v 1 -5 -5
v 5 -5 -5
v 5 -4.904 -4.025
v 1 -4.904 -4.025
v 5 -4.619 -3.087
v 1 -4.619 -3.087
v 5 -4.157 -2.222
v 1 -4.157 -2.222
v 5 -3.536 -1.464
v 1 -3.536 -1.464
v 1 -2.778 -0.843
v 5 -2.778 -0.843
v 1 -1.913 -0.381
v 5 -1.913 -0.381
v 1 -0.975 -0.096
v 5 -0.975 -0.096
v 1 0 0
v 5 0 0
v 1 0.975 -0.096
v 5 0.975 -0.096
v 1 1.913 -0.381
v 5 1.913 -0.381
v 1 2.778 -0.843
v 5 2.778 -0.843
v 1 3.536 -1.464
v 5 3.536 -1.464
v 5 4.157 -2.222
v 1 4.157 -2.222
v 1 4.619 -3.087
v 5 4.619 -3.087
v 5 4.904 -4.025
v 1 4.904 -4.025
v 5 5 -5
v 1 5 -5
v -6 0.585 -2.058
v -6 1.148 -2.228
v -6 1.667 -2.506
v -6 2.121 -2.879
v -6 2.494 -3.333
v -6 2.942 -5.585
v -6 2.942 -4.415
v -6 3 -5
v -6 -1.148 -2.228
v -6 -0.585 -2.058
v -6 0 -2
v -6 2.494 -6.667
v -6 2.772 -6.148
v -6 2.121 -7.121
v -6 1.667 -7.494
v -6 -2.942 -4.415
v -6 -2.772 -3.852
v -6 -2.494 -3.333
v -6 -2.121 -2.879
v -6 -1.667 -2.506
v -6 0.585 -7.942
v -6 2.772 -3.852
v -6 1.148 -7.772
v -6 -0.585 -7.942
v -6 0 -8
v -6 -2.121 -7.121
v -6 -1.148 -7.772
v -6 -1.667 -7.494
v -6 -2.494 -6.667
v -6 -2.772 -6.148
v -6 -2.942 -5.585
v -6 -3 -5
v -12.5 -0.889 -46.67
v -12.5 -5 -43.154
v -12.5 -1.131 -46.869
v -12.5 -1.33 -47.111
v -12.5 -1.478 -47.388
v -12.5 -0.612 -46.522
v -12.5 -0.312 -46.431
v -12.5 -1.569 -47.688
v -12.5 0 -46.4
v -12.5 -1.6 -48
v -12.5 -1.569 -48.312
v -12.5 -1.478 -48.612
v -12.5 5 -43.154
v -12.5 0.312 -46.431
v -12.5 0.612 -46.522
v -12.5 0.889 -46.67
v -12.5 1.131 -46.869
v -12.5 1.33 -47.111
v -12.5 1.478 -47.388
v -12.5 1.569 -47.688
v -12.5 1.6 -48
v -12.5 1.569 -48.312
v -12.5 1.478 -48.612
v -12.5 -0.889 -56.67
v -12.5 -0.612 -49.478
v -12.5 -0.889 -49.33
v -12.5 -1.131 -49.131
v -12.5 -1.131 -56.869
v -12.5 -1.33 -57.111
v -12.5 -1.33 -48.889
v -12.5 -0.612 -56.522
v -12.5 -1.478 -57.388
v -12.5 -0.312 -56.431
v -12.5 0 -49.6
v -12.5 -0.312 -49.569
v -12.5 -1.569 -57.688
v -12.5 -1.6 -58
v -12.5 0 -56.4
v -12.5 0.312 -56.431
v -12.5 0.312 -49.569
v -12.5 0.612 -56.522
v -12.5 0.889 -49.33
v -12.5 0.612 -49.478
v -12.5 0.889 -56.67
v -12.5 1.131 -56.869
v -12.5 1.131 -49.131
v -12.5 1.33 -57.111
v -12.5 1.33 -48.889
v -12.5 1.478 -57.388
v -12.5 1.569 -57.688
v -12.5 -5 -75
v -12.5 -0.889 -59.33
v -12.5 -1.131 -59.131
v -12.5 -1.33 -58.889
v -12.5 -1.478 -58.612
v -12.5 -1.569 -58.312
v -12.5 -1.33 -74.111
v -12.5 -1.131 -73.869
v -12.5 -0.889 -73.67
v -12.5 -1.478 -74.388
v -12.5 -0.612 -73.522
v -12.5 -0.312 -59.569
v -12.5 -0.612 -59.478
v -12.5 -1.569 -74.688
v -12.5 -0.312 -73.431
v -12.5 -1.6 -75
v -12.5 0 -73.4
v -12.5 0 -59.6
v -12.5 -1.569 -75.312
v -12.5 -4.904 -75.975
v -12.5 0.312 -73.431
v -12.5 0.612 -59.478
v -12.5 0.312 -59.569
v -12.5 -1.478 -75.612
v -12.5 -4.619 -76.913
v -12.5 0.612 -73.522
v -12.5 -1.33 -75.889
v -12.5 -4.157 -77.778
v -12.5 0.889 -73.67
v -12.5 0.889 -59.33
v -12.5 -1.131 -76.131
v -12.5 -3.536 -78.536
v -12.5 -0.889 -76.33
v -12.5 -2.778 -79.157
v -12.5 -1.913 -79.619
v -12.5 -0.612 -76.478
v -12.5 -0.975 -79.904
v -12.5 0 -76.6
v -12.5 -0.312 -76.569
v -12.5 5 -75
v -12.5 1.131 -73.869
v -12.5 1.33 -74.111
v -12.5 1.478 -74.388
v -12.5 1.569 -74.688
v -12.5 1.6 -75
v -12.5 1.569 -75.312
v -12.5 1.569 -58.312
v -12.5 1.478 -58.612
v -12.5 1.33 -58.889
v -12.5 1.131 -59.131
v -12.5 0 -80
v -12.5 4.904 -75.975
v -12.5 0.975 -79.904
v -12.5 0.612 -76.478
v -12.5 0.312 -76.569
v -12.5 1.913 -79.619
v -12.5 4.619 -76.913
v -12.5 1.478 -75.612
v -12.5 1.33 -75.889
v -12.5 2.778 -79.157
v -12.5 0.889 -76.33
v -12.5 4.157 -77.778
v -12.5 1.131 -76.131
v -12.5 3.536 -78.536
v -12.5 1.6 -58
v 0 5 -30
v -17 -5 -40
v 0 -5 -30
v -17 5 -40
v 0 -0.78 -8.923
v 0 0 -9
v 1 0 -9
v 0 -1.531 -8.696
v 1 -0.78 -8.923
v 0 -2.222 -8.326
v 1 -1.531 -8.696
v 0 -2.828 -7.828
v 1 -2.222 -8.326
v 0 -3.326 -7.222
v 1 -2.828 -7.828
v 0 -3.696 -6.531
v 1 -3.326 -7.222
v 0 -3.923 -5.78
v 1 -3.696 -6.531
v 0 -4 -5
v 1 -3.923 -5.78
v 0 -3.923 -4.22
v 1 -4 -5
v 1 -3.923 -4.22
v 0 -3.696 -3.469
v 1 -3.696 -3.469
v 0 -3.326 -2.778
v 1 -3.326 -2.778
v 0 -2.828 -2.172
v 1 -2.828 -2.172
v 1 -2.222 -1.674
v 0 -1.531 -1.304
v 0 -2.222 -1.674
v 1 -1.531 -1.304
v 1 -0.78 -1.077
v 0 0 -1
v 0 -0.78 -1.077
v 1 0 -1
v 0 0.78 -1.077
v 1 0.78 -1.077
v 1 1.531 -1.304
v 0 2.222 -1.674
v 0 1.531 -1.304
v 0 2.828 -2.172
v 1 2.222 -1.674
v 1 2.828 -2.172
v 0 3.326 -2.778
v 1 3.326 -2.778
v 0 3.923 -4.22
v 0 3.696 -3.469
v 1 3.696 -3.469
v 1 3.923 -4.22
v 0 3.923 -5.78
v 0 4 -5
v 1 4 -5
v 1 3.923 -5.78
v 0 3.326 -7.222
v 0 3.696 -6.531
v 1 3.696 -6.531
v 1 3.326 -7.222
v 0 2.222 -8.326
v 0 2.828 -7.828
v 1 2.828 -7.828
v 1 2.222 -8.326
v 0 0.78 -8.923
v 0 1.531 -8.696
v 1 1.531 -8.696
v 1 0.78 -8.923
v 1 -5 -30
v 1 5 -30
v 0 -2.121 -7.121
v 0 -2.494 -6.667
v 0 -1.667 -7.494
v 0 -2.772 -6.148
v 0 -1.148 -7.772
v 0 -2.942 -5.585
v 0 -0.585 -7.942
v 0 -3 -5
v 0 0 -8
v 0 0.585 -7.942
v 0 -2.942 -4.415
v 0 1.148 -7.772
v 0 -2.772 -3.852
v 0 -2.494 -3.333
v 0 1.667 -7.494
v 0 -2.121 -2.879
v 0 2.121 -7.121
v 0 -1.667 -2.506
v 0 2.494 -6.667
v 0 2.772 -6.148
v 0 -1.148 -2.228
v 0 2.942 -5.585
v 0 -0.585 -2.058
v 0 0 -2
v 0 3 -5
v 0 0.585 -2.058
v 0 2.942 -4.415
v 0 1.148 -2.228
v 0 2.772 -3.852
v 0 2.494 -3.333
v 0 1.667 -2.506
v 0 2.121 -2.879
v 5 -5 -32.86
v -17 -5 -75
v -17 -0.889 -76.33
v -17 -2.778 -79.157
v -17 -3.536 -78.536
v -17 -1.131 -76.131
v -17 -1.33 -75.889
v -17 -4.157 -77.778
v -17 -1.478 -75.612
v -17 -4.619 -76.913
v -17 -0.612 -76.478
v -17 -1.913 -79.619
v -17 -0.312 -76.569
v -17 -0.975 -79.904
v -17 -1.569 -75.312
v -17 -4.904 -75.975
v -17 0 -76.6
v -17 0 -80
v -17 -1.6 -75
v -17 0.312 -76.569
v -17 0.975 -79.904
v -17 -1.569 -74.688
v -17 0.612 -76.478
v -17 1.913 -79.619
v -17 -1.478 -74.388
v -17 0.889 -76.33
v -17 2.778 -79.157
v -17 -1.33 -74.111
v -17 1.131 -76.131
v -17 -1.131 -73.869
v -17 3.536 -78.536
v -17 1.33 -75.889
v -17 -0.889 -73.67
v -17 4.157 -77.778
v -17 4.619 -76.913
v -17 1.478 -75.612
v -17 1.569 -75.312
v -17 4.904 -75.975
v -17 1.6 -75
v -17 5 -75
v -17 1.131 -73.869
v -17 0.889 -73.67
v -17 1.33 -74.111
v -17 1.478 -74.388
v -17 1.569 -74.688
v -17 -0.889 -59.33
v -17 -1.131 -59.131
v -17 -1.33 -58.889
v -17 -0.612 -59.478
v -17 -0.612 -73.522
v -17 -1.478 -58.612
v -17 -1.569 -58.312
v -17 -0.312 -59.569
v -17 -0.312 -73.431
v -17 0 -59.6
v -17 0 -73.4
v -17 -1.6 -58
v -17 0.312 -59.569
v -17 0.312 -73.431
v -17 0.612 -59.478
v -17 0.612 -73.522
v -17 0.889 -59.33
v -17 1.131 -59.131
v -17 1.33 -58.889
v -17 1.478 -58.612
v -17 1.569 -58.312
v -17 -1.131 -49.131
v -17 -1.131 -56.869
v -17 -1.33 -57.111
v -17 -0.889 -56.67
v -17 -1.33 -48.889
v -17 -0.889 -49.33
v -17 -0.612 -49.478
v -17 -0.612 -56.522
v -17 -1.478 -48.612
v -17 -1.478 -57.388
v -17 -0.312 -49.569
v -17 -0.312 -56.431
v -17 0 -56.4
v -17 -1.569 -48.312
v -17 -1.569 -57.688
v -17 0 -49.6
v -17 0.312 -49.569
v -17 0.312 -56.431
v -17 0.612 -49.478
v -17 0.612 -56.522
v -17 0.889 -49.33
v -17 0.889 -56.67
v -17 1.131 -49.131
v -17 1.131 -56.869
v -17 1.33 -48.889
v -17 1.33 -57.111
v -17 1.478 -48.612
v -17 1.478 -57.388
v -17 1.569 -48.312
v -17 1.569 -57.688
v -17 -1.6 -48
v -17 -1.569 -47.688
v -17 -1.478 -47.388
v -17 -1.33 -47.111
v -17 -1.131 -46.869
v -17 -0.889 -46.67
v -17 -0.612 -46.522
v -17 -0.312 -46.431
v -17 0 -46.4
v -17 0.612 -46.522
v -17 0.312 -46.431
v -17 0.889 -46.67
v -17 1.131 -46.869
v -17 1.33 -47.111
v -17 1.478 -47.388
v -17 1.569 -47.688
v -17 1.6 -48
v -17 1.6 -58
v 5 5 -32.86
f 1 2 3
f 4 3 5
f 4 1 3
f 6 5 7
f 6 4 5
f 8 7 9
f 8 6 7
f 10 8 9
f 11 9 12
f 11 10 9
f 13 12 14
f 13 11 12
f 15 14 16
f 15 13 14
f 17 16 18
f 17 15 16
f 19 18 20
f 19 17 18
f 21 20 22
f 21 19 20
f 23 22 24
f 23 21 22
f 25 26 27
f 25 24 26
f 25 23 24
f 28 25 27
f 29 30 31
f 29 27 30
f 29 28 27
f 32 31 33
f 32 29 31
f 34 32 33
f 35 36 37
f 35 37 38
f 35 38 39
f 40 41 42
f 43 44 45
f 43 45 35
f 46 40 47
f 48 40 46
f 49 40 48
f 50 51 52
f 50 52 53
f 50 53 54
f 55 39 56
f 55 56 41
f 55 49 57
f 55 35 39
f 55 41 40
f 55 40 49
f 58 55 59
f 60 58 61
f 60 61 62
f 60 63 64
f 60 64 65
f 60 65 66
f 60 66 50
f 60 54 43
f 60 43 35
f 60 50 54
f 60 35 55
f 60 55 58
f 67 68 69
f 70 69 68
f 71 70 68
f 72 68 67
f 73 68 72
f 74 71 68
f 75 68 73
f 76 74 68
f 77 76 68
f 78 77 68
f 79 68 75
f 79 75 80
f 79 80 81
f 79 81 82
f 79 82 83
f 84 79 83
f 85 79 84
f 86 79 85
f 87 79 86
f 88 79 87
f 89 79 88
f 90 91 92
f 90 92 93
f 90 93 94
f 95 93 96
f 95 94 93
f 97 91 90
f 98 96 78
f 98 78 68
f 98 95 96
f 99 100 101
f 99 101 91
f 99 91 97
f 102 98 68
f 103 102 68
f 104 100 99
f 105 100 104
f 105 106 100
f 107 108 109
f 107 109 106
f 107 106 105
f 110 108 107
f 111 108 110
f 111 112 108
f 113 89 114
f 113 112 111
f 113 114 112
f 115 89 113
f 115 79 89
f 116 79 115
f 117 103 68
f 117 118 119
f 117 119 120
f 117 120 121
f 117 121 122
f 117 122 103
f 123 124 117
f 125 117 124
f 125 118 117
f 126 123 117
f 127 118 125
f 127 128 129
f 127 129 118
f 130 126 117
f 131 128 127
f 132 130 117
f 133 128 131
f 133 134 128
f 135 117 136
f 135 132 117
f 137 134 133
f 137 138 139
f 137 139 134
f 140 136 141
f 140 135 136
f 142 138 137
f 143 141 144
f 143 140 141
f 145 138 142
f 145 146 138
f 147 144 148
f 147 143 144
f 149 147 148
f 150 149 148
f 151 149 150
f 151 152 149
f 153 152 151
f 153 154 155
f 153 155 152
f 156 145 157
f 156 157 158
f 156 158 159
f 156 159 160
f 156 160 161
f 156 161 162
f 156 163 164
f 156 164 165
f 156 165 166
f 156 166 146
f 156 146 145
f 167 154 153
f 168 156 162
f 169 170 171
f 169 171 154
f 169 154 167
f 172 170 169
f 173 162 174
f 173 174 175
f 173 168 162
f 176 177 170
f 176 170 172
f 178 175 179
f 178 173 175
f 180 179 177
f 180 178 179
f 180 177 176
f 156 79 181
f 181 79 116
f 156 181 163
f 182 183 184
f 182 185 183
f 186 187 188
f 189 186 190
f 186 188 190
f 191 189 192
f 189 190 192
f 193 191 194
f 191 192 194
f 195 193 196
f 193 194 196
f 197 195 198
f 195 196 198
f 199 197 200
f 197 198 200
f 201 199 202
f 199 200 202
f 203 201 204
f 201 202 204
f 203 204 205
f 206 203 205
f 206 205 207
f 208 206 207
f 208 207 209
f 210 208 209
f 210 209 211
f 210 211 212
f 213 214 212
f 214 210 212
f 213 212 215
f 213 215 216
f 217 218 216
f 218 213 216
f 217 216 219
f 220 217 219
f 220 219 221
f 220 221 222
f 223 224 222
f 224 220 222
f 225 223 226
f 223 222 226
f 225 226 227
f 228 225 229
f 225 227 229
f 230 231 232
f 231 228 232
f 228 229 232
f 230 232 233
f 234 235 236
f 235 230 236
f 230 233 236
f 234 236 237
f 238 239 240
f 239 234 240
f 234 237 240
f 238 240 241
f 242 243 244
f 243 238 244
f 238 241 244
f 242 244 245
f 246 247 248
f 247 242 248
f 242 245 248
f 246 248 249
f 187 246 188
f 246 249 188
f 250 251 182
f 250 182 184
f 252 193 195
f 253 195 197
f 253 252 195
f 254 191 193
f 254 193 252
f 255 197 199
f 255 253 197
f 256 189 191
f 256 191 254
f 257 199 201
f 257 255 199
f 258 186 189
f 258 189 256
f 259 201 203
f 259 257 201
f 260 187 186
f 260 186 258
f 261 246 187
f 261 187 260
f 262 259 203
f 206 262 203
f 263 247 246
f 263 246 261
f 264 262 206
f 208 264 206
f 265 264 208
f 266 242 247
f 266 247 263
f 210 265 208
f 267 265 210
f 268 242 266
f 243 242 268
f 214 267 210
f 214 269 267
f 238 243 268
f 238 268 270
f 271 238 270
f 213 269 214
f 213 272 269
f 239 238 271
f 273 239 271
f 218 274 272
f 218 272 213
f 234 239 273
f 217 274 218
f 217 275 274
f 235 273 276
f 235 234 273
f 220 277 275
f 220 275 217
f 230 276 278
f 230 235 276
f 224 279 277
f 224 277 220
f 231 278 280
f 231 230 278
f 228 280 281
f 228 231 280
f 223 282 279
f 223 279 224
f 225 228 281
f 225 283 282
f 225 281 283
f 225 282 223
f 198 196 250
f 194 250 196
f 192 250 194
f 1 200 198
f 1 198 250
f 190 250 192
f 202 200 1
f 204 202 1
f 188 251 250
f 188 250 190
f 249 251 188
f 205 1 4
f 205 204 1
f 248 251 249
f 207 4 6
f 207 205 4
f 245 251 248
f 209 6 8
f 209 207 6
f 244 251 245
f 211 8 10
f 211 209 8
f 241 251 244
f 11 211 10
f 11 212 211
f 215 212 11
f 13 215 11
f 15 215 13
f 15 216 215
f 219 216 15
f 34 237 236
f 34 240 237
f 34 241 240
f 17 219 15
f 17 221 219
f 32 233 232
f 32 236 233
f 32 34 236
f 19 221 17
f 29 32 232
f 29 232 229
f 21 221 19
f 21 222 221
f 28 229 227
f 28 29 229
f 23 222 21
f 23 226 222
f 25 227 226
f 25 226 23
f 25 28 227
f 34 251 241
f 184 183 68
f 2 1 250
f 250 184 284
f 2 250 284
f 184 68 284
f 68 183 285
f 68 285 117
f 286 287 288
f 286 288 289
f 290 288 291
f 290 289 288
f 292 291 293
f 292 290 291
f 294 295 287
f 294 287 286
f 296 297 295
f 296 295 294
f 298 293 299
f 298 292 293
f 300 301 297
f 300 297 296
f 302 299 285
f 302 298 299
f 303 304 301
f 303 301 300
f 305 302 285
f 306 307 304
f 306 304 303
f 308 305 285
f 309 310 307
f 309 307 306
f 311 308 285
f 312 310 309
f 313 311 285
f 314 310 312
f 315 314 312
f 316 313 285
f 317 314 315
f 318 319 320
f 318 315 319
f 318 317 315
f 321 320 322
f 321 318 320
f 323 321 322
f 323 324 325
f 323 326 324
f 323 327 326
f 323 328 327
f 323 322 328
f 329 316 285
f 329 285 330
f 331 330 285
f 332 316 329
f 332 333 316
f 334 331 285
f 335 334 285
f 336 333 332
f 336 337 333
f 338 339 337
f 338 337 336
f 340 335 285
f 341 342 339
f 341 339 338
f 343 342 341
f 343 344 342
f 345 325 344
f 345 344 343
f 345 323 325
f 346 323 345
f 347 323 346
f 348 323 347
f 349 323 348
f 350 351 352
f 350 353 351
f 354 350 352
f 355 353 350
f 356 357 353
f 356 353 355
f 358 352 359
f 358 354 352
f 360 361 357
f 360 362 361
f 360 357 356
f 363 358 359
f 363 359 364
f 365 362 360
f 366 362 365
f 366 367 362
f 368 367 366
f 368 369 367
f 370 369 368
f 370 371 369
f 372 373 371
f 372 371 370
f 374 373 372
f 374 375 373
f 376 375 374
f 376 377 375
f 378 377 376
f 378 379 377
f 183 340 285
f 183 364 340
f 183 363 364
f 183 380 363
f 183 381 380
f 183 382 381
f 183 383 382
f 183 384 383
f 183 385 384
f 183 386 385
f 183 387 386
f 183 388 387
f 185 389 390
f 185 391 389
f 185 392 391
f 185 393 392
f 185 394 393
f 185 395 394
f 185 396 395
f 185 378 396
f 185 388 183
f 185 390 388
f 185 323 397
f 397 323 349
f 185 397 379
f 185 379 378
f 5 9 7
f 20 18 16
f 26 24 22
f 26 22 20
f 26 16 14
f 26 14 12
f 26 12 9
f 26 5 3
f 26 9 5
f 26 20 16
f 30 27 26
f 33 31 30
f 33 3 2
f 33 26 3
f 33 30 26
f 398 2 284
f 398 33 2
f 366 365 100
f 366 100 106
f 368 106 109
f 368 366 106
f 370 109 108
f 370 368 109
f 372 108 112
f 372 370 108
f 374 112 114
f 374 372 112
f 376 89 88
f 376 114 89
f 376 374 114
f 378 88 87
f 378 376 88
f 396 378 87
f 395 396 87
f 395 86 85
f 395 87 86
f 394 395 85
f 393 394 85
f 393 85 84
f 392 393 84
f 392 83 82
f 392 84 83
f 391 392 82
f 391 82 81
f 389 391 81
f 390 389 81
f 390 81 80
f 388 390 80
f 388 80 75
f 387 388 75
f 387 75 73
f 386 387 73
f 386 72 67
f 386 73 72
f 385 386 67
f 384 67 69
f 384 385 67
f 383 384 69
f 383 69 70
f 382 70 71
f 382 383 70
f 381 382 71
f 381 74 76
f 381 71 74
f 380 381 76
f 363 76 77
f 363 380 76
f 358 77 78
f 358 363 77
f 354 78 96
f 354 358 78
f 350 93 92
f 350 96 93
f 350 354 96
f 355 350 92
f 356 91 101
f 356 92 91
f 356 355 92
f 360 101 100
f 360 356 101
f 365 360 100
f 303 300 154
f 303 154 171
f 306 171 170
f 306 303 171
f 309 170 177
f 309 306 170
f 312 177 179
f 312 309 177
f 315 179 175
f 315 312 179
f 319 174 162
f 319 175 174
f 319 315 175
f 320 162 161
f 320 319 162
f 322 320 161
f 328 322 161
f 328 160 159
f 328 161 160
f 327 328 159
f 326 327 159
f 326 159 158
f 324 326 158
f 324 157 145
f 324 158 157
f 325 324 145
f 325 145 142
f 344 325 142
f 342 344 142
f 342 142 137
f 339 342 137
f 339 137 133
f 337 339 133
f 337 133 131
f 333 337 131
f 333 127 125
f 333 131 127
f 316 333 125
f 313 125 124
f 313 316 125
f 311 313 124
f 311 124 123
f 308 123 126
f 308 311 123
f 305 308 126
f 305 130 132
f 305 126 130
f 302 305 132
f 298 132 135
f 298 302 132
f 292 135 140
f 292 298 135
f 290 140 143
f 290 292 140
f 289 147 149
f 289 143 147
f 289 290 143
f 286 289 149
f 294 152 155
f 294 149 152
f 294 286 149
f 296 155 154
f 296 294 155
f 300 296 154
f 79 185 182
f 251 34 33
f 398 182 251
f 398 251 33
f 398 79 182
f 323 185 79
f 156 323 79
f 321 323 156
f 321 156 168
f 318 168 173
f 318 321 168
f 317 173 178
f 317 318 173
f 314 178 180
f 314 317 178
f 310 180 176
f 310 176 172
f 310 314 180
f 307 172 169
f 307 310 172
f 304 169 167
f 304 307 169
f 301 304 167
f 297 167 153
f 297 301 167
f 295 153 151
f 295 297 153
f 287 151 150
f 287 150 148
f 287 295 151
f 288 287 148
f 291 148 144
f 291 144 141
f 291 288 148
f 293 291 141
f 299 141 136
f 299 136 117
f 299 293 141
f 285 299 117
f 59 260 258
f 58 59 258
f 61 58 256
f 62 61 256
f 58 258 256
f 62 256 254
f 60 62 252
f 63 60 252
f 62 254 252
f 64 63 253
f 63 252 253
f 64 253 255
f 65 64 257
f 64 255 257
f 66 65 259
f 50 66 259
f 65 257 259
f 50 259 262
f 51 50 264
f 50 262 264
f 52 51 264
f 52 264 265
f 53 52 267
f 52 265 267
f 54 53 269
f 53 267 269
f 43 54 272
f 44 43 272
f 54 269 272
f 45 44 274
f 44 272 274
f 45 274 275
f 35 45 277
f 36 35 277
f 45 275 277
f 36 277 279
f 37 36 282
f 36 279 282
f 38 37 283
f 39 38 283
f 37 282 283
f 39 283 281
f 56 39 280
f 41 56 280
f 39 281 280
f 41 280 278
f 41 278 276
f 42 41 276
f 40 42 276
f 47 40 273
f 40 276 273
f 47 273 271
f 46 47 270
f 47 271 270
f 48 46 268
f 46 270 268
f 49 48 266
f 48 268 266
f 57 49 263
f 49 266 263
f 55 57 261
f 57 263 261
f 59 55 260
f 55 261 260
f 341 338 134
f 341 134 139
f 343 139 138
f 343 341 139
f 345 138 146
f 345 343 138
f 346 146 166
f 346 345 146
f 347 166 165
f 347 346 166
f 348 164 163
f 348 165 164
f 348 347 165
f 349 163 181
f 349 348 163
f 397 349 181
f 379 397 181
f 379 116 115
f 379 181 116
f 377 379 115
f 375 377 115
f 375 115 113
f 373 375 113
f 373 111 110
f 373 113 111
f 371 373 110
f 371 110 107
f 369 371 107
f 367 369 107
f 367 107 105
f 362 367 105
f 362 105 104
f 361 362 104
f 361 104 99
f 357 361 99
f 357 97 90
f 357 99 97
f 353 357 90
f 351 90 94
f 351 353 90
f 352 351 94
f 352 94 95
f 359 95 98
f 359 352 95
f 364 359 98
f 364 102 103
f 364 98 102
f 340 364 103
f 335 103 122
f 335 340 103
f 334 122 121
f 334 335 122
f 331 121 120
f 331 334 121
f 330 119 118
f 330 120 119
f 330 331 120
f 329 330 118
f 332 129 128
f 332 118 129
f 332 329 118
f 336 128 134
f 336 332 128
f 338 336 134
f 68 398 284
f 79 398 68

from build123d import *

# Parameters (mm, degrees)
EXTRUDE_2_DEPTH          = 5
CUT_EXTRUDE_1_DEPTH      = 83.044195407
CUT_EXTRUDE_1_DEPTH_BACK = 83.044195407
SKETCH_3_OUTSIDE_W       = 98.714
SKETCH_3_OUTSIDE_H       = 28.714
CUT_EXTRUDE_2_DEPTH      = 84.120394609
CUT_EXTRUDE_2_DEPTH_BACK = 84.120394609
SKETCH_4_R               = 1.6
SKETCH_5_R               = 3
EXTRUDE_4_DEPTH          = 6
CUT_EXTRUDE_3_DEPTH      = 82.939001702
CUT_EXTRUDE_3_DEPTH_BACK = 1
SKETCH_6_R               = 4


with BuildPart() as part:
    # 草图2 → 凸台-拉伸2 (new, symmetric)
    with BuildSketch(Plane(origin=(0, 0, 0), x_dir=(1, 0, 0), z_dir=(0, 1, 0))):
        Polygon((-17, 40), (0, 30), (0, 0), (5, 0), (5, 32.859730272), (-12.5, 43.153847919), (-12.5, 80), (-17, 80), align=None)
    extrude(amount=EXTRUDE_2_DEPTH, both=True)

    # 草图3 outside → 切除-拉伸1 (cut, two sides: drawn at the far end of the back side and taken through both)
    with BuildSketch(Plane(origin=(-12.5, 0, 0), x_dir=(0, 0, -1), z_dir=(1, 0, 0)).offset(-CUT_EXTRUDE_1_DEPTH_BACK)):
        with Locations((40, 0)):
            Rectangle(SKETCH_3_OUTSIDE_W, SKETCH_3_OUTSIDE_H)
        with BuildLine():
            Line((5, 5), (75, 5))
            ThreePointArc((75, 5), (80, 0), (75, -5))
            Line((75, -5), (5, -5))
            ThreePointArc((5, -5), (0, 0), (5, 5))
        make_face(mode=Mode.SUBTRACT)
    extrude(amount=CUT_EXTRUDE_1_DEPTH + CUT_EXTRUDE_1_DEPTH_BACK, mode=Mode.SUBTRACT)

    # 草图4 → 切除-拉伸2 (cut, two sides: drawn at the far end of the back side and taken through both)
    with BuildSketch(Plane(origin=(5, 0, 0), x_dir=(0, 0, -1), z_dir=(1, 0, 0)).offset(-CUT_EXTRUDE_2_DEPTH_BACK)):
        with Locations((75, 0)):
            Circle(SKETCH_4_R)
        with Locations((58, 0)):
            Circle(SKETCH_4_R)
        with Locations((48, 0)):
            Circle(SKETCH_4_R)
    extrude(amount=CUT_EXTRUDE_2_DEPTH + CUT_EXTRUDE_2_DEPTH_BACK, mode=Mode.SUBTRACT)

    # 草图5 → 凸台-拉伸4 (add)
    with BuildSketch(Plane.ZY):
        with Locations(Location((-5, 0, 0), (0, 0, 180))):
            Circle(SKETCH_5_R)
    extrude(amount=EXTRUDE_4_DEPTH)

    # 草图6 → 切除-拉伸3 (cut, two sides: drawn at the far end of the back side and taken through both)
    with BuildSketch(Plane.ZY.offset(-CUT_EXTRUDE_3_DEPTH_BACK)):
        with BuildLine():
            Line((-5, 5), (-30, 5))
            Line((-30, 5), (-30, -5))
            Line((-30, -5), (-5, -5))
            ThreePointArc((-5, -5), (0, 0), (-5, 5))
        make_face()
        with Locations(Location((-5, 0, 0), (0, 0, 180))):
            Circle(SKETCH_6_R, mode=Mode.SUBTRACT)
    extrude(amount=CUT_EXTRUDE_3_DEPTH + CUT_EXTRUDE_3_DEPTH_BACK, mode=Mode.SUBTRACT)


solid = part.part
